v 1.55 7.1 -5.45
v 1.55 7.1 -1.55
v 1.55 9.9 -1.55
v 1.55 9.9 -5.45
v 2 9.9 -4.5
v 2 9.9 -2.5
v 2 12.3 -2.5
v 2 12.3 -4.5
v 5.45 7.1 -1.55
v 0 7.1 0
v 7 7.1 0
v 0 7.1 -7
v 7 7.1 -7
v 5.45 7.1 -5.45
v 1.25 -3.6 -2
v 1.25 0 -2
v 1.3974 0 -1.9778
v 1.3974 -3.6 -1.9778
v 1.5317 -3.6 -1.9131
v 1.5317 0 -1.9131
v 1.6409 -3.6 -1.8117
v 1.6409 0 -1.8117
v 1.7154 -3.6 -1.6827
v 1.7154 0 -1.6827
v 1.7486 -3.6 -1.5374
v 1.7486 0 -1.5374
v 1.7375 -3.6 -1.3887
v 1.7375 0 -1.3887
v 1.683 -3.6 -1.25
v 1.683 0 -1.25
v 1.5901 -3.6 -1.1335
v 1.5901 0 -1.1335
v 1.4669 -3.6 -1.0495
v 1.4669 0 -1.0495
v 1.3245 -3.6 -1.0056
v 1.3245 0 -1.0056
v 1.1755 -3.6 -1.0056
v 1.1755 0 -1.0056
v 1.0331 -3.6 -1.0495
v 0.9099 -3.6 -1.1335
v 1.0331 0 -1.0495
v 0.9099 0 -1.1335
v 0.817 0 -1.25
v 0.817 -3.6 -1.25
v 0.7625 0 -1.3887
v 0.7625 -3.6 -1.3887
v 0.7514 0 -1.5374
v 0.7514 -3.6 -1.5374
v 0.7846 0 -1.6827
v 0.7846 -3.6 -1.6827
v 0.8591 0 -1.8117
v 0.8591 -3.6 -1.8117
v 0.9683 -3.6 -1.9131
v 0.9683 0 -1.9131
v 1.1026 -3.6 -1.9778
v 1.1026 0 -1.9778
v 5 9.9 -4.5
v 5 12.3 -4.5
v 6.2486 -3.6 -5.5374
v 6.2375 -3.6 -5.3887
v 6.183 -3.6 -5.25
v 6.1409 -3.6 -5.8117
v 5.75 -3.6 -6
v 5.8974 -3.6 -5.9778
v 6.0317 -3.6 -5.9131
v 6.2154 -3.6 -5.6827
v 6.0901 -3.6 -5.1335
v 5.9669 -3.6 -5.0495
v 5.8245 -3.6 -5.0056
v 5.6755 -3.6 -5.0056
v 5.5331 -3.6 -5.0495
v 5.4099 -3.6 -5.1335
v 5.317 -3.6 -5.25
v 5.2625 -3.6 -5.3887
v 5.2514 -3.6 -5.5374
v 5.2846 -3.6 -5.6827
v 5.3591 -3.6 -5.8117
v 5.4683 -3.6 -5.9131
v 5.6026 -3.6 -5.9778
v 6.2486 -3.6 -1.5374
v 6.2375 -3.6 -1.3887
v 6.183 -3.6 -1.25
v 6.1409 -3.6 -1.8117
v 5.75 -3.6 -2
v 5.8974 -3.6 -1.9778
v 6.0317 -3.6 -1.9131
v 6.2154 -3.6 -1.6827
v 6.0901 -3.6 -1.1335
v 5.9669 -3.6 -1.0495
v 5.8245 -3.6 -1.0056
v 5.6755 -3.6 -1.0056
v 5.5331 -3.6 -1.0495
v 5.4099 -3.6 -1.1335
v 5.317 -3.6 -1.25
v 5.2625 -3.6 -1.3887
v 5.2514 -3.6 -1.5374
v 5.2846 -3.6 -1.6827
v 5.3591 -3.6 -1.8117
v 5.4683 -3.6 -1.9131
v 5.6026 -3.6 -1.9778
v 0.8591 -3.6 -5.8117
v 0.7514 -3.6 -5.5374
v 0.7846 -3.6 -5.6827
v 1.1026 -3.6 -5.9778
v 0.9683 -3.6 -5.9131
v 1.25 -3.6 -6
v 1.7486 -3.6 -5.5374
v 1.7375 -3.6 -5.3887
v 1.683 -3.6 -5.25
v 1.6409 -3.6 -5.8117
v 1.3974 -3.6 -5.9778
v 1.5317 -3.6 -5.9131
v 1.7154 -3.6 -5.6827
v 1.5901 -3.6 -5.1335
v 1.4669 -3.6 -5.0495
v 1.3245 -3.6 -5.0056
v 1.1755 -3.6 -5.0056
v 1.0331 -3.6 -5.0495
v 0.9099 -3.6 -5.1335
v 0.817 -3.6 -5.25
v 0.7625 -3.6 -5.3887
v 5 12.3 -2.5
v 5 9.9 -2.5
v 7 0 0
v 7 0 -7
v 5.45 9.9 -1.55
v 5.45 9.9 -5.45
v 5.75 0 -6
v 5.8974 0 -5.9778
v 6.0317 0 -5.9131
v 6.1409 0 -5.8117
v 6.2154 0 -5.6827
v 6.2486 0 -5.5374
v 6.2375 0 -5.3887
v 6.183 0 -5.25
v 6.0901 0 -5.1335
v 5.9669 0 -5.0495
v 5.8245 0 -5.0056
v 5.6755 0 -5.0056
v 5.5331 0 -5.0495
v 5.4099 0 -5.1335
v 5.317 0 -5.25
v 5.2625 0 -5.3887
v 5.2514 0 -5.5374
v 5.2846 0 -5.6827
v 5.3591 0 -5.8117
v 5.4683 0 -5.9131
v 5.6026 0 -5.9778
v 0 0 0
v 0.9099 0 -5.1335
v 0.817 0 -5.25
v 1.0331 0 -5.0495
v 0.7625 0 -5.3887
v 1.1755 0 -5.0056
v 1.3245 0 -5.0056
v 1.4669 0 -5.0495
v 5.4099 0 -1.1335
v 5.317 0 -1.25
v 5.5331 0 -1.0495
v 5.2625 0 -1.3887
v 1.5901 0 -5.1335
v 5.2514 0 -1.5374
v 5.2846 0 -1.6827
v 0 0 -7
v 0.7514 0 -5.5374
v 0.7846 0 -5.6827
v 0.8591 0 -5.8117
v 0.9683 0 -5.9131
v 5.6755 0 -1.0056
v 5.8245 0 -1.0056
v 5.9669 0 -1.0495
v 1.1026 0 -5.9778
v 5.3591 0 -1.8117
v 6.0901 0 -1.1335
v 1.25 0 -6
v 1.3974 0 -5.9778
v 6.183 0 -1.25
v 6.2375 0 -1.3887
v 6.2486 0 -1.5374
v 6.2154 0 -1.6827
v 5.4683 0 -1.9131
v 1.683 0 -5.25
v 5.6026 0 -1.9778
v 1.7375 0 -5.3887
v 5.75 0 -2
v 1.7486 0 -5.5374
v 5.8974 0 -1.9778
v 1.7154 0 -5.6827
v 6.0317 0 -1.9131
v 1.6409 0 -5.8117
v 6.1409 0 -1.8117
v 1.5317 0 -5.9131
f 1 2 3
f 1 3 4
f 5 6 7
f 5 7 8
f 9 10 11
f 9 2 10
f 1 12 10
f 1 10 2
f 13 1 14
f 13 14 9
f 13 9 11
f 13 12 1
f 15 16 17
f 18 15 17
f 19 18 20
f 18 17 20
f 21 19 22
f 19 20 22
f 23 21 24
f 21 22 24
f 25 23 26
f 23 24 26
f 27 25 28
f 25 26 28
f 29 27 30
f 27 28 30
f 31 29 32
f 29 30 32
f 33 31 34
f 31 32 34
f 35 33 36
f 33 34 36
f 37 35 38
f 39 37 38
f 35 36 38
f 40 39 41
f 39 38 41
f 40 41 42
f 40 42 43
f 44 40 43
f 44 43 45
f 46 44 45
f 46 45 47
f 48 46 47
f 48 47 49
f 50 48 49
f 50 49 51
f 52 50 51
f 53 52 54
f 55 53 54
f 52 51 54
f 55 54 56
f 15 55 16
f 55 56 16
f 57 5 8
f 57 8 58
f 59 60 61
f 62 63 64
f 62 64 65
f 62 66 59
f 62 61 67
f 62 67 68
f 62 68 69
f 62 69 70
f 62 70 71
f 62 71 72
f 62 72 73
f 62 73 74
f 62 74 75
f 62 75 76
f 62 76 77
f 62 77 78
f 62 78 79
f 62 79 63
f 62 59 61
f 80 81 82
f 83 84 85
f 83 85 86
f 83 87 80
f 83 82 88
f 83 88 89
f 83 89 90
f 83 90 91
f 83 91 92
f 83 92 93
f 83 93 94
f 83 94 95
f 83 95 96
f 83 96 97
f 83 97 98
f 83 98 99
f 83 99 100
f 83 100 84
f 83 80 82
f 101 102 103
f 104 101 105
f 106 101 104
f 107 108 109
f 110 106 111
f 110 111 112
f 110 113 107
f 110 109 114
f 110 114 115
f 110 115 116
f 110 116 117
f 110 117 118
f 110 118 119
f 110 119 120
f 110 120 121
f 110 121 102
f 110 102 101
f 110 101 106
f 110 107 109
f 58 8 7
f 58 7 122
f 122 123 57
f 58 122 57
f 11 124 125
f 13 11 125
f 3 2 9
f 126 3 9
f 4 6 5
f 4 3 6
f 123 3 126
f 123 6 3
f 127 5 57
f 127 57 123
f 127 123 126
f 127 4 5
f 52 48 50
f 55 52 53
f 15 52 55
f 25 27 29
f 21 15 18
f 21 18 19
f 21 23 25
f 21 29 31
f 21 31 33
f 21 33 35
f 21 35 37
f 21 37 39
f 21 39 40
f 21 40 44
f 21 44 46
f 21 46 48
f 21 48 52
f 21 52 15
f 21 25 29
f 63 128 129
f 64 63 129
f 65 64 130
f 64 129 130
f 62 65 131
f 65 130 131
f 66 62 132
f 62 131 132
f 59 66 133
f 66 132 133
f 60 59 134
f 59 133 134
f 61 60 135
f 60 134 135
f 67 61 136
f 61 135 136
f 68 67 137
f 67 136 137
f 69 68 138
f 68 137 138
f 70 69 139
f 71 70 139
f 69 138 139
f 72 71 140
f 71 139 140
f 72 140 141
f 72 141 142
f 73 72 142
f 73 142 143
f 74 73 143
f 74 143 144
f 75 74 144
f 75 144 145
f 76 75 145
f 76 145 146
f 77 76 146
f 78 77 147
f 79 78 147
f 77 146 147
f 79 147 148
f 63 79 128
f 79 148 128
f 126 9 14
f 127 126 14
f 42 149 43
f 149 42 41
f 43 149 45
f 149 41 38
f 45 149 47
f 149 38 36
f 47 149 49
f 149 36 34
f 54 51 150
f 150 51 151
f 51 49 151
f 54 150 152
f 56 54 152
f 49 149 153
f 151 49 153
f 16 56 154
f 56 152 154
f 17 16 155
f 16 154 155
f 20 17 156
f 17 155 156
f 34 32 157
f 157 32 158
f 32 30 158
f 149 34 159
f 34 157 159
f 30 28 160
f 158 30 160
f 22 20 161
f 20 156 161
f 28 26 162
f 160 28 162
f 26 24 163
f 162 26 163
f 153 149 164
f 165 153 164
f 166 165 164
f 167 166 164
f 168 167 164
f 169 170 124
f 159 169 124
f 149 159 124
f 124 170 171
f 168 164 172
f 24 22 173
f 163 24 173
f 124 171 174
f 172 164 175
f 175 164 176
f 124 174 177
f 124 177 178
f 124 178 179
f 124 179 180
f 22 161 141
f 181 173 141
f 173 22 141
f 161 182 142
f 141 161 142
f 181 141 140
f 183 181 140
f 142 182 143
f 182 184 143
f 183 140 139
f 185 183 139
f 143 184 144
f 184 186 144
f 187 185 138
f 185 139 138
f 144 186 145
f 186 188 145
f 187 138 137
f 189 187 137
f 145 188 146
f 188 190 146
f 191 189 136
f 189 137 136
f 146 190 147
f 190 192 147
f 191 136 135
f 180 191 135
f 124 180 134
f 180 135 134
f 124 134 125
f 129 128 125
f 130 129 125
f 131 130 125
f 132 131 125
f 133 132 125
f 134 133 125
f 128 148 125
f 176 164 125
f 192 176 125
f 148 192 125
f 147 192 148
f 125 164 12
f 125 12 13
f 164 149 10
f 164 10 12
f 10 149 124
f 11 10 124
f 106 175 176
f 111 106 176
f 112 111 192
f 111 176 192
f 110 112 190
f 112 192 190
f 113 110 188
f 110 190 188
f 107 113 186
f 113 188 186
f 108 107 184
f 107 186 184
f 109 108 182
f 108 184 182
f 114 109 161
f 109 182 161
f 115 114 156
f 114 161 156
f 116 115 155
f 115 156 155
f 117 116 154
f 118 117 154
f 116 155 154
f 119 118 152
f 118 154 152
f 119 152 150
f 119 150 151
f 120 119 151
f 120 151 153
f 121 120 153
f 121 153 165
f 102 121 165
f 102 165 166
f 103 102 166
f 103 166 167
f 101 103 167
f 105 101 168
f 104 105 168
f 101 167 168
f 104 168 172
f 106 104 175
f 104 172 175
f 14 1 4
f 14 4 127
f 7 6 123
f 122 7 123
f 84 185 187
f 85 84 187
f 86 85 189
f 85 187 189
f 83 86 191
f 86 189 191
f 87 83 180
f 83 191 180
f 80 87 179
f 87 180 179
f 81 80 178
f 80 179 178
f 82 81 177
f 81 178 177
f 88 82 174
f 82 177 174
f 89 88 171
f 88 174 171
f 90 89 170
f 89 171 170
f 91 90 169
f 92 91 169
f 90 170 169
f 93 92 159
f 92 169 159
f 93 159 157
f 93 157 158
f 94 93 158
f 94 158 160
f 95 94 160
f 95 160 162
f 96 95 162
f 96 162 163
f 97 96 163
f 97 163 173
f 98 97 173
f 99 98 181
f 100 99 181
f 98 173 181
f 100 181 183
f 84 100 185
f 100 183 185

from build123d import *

# Parameters (mm, degrees)
SKETCH_1_W      = 7
SKETCH_1_H      = 7
EXTRUDE_1_DEPTH = 7.1
SKETCH_2_W      = 3.9
SKETCH_2_H      = 3.9
EXTRUDE_2_DEPTH = 2.8
SKETCH_3_R      = 0.5
EXTRUDE_3_DEPTH = 3.6
SKETCH_4_W      = 3
SKETCH_4_H      = 2
EXTRUDE_4_DEPTH = 2.4


with BuildPart() as part:
    # 草图1 → 凸台-拉伸1 (new body)
    with BuildSketch(Plane(origin=(0, 0, 0), x_dir=(1, 0, 0), z_dir=(0, 1, 0))):
        with Locations((3.5, 3.5)):
            Rectangle(SKETCH_1_W, SKETCH_1_H)
    extrude(amount=EXTRUDE_1_DEPTH)

    # 草图2 → 凸台-拉伸2 (add)
    with BuildSketch(Plane(origin=(0, 7.1, 0), x_dir=(1, 0, 0), z_dir=(0, 1, 0))):
        with Locations((3.5, 3.5)):
            Rectangle(SKETCH_2_W, SKETCH_2_H)
    extrude(amount=EXTRUDE_2_DEPTH)

    # 草图3 → 凸台-拉伸3 (add)
    with BuildSketch(Plane.XZ):
        with Locations(Location((1.25, -1.5, 0), (0, 0, 270))):
            Circle(SKETCH_3_R)
        with Locations(Location((5.75, -1.5, 0), (0, 0, 270))):
            Circle(SKETCH_3_R)
        with Locations(Location((5.75, -5.5, 0), (0, 0, 270))):
            Circle(SKETCH_3_R)
        with Locations(Location((1.25, -5.5, 0), (0, 0, 270))):
            Circle(SKETCH_3_R)
    extrude(amount=EXTRUDE_3_DEPTH)

    # 草图4 → 凸台-拉伸4 (add)
    with BuildSketch(Plane(origin=(0, 9.9, 0), x_dir=(1, 0, 0), z_dir=(0, 1, 0))):
        with Locations((3.5, 3.5)):
            Rectangle(SKETCH_4_W, SKETCH_4_H)
    extrude(amount=EXTRUDE_4_DEPTH)


solid = part.part
